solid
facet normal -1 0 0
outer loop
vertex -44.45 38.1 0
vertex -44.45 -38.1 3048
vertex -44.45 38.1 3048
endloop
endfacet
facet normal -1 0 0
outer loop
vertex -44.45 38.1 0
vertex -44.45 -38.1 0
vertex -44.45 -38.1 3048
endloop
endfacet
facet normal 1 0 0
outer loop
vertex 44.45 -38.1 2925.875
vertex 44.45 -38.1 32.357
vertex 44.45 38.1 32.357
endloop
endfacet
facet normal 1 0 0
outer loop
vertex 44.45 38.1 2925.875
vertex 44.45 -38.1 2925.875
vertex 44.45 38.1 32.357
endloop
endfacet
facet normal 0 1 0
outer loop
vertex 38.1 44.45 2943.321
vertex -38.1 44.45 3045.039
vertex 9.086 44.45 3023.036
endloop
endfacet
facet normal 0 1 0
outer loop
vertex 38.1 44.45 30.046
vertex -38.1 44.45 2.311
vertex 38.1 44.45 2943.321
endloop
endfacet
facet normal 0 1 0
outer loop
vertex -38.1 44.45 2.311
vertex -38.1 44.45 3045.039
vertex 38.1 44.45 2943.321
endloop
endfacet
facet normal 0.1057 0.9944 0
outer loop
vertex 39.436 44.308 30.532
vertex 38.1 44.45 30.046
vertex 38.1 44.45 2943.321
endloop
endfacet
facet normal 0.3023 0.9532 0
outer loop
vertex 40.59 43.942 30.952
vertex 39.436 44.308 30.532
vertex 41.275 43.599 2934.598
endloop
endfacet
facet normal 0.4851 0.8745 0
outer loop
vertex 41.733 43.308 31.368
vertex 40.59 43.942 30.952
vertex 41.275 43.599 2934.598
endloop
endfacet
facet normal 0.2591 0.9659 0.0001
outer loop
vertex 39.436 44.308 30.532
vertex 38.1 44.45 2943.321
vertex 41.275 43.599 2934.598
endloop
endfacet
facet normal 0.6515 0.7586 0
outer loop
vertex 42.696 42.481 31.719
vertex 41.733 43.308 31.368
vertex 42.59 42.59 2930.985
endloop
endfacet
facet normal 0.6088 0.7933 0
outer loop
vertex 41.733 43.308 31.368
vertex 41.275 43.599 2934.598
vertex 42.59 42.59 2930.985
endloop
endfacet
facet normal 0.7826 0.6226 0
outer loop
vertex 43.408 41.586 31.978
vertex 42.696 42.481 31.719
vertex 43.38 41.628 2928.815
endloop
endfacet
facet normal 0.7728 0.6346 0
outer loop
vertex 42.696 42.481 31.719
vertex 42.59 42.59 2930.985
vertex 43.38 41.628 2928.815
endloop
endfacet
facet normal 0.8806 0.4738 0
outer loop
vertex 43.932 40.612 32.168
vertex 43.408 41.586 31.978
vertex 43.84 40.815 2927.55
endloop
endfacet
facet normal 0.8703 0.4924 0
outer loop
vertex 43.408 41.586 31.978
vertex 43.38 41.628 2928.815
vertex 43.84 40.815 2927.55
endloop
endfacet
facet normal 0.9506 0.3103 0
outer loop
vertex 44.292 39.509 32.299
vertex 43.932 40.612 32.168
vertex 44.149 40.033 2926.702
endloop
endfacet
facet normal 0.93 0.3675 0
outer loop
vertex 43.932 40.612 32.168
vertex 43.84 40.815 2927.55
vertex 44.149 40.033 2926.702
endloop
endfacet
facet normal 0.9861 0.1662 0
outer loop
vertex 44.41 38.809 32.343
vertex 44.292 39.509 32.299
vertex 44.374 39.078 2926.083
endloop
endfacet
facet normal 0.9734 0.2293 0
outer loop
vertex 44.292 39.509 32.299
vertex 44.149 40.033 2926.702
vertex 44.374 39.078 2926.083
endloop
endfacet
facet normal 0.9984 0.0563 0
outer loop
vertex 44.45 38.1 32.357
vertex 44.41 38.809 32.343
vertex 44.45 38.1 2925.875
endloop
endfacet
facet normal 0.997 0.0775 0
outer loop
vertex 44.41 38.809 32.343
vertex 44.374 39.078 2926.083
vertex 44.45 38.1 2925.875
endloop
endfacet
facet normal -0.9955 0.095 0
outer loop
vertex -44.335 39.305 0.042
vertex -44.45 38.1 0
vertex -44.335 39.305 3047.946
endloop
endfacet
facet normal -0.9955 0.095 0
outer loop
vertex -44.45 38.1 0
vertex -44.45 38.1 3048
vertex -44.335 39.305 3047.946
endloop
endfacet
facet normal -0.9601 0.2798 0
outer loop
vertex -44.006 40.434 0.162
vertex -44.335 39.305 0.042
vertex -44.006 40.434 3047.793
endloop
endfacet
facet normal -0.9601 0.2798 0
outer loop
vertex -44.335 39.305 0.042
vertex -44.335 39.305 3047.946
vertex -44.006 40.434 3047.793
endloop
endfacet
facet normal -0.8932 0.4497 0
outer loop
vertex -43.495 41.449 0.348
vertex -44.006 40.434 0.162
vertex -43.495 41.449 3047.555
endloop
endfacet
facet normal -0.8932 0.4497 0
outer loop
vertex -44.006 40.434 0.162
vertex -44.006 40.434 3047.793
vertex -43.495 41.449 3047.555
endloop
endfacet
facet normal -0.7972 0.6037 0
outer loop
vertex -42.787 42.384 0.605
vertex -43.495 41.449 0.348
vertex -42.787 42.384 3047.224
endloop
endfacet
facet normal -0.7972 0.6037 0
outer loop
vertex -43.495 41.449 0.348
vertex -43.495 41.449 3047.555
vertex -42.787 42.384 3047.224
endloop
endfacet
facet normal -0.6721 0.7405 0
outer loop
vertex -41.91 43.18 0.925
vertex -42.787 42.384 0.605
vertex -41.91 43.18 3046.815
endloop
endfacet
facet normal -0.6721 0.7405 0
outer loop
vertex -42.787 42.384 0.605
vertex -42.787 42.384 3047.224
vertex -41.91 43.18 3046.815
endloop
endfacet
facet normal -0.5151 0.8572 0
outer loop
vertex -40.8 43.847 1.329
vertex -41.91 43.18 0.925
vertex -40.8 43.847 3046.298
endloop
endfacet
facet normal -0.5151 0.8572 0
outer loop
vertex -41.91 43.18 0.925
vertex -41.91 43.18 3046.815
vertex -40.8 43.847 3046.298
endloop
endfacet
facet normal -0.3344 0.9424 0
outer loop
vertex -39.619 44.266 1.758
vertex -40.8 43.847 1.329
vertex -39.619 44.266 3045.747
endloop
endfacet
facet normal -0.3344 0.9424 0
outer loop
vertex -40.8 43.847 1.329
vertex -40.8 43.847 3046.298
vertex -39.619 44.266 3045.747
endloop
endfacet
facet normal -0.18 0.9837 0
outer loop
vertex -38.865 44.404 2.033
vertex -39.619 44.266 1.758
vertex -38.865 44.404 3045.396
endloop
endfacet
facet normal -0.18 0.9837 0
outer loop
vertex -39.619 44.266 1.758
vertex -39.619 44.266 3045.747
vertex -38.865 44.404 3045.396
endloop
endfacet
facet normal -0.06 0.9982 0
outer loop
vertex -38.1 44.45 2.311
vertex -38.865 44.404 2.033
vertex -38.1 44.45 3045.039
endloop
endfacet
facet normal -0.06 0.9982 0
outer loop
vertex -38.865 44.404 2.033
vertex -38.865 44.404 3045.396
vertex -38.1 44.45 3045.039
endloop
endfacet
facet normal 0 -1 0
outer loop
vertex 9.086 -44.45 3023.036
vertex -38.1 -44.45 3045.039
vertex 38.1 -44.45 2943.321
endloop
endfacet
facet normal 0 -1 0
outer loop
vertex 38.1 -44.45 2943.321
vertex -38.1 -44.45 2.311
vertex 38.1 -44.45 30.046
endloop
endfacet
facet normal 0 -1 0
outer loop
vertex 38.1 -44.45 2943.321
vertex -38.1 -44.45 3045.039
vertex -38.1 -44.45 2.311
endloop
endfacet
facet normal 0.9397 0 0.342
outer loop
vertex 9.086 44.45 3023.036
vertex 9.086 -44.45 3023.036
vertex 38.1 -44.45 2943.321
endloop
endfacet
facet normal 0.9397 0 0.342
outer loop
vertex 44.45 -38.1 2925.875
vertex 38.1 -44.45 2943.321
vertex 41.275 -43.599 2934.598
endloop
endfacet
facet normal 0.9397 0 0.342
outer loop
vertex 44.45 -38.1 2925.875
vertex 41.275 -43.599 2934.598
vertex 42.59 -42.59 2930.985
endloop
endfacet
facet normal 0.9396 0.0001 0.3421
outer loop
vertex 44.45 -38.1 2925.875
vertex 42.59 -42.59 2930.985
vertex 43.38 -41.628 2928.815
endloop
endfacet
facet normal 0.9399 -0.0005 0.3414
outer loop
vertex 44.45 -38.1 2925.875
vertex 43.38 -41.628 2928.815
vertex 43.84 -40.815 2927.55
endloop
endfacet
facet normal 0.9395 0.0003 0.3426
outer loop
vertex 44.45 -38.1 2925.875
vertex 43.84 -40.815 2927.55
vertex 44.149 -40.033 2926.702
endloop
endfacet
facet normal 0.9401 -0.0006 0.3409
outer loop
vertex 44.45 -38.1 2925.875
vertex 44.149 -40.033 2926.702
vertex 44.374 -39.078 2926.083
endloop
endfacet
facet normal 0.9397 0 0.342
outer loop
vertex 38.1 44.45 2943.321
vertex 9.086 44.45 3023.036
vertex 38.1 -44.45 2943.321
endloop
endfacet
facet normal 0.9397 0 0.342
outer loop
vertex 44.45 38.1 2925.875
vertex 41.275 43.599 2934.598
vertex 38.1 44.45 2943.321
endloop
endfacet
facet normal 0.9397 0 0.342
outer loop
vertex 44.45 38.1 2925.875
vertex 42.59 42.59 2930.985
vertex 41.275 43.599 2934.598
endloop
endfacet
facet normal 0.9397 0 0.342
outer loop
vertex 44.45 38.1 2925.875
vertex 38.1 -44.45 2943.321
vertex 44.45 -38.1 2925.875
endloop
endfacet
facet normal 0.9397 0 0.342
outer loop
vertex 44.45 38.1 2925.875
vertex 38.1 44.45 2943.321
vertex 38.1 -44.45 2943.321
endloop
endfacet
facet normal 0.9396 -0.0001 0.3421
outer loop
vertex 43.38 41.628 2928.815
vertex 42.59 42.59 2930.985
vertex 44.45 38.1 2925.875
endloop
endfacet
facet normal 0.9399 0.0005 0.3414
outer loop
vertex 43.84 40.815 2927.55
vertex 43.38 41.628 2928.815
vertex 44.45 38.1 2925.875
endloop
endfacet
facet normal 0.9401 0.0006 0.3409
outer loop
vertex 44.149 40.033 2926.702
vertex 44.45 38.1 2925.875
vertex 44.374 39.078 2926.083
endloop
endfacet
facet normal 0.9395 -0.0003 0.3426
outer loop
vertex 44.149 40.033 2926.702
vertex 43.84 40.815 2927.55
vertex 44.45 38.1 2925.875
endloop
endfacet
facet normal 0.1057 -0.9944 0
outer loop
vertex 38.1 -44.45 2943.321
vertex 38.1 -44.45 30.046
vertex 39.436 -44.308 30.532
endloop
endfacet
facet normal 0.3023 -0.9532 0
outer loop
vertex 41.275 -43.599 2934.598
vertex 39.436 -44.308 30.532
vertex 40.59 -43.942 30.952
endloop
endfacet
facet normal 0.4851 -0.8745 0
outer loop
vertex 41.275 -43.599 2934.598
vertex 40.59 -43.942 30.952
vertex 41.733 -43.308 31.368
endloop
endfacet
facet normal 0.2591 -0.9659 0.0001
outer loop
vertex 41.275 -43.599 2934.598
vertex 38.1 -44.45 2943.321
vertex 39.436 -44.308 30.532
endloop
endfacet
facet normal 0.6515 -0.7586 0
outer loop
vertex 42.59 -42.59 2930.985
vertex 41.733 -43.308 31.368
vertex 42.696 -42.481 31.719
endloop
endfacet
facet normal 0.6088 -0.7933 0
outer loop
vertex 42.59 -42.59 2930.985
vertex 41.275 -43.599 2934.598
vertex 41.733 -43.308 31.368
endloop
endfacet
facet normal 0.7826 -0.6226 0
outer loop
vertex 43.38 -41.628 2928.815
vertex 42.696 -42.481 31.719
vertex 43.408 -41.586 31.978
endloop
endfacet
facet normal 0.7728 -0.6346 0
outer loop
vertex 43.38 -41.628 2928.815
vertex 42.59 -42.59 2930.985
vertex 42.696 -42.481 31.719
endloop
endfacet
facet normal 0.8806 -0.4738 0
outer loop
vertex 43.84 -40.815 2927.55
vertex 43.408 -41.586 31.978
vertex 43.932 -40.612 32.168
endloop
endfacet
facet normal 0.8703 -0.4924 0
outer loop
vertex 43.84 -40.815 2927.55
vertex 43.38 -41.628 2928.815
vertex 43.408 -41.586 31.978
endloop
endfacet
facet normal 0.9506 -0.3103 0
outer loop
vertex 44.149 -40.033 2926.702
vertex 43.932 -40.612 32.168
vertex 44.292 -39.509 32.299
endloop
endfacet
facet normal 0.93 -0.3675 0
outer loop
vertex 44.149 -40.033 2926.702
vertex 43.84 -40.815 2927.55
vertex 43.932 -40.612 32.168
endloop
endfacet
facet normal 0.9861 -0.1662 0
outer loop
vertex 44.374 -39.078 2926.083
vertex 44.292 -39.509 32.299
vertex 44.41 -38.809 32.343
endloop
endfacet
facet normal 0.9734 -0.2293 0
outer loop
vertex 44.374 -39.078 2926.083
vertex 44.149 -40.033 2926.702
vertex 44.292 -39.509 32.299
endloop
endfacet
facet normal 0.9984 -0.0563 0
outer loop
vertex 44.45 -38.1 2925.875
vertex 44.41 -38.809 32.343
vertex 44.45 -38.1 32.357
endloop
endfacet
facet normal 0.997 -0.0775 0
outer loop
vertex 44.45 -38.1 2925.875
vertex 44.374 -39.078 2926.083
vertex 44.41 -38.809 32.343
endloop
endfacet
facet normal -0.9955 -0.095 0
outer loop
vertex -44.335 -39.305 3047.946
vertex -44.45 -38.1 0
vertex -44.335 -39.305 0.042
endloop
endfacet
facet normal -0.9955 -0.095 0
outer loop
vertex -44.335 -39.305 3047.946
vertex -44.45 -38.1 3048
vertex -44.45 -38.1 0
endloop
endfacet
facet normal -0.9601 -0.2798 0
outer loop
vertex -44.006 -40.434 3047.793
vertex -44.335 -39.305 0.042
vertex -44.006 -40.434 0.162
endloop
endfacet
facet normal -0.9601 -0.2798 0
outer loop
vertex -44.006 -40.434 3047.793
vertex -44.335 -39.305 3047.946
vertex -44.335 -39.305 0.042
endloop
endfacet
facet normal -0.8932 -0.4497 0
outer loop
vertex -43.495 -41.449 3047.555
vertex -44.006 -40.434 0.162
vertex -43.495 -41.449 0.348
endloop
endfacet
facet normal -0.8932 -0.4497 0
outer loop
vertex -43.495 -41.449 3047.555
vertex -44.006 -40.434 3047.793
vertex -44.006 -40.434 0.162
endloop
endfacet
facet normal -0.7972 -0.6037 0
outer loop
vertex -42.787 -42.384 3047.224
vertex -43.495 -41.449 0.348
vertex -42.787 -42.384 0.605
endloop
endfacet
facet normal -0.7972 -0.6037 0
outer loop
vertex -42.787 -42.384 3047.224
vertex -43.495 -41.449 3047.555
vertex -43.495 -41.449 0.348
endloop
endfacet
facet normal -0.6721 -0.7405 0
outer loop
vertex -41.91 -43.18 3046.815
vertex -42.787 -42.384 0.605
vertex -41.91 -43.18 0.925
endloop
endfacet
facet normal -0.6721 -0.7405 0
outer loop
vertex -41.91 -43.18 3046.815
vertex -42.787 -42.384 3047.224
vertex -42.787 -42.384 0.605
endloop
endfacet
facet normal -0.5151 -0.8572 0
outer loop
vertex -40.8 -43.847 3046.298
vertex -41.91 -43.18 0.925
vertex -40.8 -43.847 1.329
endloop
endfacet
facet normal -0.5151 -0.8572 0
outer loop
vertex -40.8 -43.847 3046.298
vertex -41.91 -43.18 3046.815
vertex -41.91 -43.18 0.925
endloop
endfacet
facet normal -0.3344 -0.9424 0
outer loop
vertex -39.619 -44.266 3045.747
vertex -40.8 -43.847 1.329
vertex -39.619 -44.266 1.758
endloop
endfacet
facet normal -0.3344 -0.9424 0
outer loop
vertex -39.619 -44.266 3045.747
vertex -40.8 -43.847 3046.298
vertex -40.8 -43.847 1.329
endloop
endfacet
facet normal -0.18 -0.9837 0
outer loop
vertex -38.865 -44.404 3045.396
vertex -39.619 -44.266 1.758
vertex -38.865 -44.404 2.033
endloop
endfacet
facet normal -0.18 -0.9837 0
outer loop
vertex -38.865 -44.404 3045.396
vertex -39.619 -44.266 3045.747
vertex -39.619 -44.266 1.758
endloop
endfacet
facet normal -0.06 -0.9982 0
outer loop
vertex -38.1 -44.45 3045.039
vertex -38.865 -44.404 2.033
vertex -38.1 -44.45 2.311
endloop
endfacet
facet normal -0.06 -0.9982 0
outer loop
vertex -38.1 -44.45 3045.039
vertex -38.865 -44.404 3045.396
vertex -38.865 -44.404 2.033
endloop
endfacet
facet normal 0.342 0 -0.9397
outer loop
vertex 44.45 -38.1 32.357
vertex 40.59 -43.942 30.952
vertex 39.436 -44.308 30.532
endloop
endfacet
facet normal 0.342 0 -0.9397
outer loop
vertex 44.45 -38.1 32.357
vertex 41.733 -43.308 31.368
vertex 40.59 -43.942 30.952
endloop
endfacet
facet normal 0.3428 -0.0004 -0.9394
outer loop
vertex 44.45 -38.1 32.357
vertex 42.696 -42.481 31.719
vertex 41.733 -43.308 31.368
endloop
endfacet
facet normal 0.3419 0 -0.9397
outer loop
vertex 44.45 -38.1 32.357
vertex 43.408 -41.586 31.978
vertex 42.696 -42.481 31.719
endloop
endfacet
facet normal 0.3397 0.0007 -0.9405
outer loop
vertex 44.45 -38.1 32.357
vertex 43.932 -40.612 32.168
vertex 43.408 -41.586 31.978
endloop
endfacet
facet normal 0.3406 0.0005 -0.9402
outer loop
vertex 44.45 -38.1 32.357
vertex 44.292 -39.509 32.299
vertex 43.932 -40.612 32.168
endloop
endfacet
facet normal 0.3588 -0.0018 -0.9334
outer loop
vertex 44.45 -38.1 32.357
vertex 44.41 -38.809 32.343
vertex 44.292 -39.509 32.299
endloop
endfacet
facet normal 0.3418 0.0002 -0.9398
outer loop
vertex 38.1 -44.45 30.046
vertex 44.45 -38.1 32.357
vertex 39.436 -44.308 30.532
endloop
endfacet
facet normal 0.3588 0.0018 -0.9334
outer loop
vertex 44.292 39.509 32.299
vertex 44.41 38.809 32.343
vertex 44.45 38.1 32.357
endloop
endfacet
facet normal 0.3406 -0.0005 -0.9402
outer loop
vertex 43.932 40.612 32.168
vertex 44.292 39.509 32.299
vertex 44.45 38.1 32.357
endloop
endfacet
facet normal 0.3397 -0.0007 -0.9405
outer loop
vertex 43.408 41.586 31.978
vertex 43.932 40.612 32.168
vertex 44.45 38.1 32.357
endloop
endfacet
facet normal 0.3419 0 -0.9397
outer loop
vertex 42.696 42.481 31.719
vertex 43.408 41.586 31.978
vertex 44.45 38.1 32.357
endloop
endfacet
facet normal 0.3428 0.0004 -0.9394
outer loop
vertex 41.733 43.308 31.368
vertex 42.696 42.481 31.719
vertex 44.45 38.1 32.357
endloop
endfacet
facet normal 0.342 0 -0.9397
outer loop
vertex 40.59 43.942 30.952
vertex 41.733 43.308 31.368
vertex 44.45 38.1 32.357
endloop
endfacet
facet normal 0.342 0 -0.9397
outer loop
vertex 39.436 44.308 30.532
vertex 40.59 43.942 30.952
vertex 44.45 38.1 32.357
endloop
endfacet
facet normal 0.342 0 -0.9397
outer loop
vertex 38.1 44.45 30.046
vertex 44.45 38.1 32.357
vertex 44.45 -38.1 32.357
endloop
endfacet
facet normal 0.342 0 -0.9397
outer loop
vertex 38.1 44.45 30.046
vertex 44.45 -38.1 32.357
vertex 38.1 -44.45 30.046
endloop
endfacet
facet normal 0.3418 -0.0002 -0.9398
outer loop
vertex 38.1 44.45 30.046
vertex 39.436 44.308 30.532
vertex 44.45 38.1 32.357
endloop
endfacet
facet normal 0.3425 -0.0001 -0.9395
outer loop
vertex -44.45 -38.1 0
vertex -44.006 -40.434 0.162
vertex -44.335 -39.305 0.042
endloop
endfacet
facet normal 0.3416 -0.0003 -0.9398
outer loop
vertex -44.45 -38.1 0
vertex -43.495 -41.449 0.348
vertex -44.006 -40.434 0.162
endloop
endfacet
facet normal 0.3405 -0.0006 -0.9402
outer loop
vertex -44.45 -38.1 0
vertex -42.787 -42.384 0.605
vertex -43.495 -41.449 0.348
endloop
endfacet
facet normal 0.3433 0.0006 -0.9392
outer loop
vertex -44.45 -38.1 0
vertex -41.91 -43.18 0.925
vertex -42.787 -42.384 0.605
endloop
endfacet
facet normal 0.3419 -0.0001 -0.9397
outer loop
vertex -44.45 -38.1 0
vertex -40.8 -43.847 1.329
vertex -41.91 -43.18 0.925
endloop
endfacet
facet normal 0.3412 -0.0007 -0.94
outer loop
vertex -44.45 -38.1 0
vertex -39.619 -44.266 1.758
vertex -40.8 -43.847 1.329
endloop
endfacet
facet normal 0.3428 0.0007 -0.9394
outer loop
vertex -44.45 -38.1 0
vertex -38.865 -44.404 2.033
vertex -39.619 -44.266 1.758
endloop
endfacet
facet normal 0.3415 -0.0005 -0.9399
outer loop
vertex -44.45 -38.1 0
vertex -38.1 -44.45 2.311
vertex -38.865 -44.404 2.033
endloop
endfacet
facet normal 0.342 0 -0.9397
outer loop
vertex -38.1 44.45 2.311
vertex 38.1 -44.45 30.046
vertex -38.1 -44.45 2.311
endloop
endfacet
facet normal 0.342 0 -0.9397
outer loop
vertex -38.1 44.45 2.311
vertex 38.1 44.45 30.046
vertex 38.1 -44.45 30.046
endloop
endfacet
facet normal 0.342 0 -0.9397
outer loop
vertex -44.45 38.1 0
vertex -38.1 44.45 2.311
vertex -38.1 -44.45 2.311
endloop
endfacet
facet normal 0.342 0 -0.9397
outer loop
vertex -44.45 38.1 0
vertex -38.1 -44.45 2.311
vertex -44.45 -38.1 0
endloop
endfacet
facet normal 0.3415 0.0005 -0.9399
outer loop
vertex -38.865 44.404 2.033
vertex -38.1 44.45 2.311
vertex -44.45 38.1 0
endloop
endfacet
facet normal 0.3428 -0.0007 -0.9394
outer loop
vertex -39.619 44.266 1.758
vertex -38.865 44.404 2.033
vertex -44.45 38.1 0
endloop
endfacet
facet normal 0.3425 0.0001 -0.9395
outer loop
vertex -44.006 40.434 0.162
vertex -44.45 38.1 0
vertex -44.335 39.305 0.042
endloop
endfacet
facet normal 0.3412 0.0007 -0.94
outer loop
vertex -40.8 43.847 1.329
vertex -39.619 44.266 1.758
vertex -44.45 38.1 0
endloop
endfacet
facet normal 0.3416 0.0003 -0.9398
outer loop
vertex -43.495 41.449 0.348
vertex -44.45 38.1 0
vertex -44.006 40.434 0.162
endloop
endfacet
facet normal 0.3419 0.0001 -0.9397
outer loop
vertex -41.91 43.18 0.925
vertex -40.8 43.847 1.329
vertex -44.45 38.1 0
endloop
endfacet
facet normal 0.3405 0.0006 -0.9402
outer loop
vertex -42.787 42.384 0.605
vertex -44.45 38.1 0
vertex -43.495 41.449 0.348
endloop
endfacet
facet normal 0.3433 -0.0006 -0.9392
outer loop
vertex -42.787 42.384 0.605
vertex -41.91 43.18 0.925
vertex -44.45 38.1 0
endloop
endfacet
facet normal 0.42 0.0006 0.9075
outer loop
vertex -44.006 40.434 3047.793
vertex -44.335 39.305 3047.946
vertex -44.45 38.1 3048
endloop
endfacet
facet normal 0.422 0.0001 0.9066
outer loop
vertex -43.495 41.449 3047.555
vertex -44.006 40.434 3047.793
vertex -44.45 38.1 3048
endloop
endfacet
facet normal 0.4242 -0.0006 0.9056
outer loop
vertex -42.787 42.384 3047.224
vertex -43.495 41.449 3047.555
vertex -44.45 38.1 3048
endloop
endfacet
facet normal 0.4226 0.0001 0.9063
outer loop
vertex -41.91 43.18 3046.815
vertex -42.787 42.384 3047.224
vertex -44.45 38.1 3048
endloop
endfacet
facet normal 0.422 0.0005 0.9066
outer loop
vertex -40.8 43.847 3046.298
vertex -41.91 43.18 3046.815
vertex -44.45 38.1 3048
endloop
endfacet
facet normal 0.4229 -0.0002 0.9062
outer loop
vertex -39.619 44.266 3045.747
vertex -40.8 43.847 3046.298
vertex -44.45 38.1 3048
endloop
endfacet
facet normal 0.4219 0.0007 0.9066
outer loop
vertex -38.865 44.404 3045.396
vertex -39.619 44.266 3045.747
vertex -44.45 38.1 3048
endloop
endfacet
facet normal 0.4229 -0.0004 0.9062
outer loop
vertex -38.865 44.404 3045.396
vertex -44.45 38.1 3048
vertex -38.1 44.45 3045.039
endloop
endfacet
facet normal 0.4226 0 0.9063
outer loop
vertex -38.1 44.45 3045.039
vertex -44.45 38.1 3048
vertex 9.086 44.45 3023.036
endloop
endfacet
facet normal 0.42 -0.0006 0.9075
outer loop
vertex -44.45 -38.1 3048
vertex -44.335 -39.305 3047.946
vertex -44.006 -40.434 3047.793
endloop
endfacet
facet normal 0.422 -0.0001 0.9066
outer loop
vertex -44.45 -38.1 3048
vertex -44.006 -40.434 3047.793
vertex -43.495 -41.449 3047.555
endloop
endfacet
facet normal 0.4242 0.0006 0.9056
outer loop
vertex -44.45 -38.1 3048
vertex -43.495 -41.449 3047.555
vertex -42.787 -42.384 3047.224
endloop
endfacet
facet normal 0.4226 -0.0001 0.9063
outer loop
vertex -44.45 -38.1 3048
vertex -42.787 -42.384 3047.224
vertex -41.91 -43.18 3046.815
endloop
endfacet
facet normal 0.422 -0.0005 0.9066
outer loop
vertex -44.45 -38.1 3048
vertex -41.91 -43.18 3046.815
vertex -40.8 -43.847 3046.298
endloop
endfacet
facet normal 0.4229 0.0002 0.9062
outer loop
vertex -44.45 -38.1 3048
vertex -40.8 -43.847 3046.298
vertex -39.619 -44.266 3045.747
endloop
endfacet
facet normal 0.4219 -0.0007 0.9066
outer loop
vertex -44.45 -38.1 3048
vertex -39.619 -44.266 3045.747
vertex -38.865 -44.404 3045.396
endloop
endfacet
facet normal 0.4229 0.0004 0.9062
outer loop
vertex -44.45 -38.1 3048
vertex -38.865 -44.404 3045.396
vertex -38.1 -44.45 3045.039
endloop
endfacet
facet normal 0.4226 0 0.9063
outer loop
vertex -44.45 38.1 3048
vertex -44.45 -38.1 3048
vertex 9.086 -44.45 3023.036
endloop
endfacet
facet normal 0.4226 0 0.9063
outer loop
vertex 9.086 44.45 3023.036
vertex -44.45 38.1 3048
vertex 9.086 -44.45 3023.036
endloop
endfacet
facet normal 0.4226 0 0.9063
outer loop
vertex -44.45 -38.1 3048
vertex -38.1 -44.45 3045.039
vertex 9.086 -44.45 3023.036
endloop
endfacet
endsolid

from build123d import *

# Parameters (mm, degrees)
F0_W          = 88.9
F0_H          = 88.9
F1_DEPTH      = 3048
F3_DEPTH      = 44.451
F3_DEPTH_BACK = 44.451
F5_DEPTH      = 44.451
F5_DEPTH_BACK = 44.451
F7_DEPTH      = 88.901
F8_R          = 6.35


with BuildPart() as f1:
    # F0 (on Top) → F1 (new body)
    with BuildSketch(Plane.XY):
        Rectangle(F0_W, F0_H)
    extrude(amount=F1_DEPTH)

    # F2 (on Front) → F3 (cut, two sides)
    with BuildSketch(Plane.XZ) as f3_sk:
        Polygon((44.45, 3048), (0, 3048), (44.45, 2925.8746287052), align=None)
    extrude(amount=F3_DEPTH, mode=Mode.SUBTRACT)
    extrude(f3_sk.sketch, amount=-F3_DEPTH_BACK, mode=Mode.SUBTRACT)

    # F4 (on Front) → F5 (cut, two sides)
    with BuildSketch(Plane.XZ) as f5_sk:
        Polygon((44.45, 0), (44.45, 32.3569538263), (-44.45, 0), align=None)
    extrude(amount=-F5_DEPTH, mode=Mode.SUBTRACT)
    extrude(f5_sk.sketch, amount=F5_DEPTH_BACK, mode=Mode.SUBTRACT)

    # F6 (on face) → F7 (cut, through all)
    with BuildSketch(Plane.XZ.offset(44.45)):
        Polygon((0, 3048), (-44.45, 3048), (9.0862923736, 3023.035616877), align=None)
    extrude(amount=-F7_DEPTH, mode=Mode.SUBTRACT)

    # F8
    f8_edges = [f1.edges().sort_by_distance(p)[0] for p in [
        (-44.45, -44.45, 1524),
        (44.45, -44.45, 1479.115791),
        (44.45, 44.45, 1479.115791),
        (-44.45, 44.45, 1524),
    ]]
    fillet(f8_edges, radius=F8_R)


solid = f1.part
